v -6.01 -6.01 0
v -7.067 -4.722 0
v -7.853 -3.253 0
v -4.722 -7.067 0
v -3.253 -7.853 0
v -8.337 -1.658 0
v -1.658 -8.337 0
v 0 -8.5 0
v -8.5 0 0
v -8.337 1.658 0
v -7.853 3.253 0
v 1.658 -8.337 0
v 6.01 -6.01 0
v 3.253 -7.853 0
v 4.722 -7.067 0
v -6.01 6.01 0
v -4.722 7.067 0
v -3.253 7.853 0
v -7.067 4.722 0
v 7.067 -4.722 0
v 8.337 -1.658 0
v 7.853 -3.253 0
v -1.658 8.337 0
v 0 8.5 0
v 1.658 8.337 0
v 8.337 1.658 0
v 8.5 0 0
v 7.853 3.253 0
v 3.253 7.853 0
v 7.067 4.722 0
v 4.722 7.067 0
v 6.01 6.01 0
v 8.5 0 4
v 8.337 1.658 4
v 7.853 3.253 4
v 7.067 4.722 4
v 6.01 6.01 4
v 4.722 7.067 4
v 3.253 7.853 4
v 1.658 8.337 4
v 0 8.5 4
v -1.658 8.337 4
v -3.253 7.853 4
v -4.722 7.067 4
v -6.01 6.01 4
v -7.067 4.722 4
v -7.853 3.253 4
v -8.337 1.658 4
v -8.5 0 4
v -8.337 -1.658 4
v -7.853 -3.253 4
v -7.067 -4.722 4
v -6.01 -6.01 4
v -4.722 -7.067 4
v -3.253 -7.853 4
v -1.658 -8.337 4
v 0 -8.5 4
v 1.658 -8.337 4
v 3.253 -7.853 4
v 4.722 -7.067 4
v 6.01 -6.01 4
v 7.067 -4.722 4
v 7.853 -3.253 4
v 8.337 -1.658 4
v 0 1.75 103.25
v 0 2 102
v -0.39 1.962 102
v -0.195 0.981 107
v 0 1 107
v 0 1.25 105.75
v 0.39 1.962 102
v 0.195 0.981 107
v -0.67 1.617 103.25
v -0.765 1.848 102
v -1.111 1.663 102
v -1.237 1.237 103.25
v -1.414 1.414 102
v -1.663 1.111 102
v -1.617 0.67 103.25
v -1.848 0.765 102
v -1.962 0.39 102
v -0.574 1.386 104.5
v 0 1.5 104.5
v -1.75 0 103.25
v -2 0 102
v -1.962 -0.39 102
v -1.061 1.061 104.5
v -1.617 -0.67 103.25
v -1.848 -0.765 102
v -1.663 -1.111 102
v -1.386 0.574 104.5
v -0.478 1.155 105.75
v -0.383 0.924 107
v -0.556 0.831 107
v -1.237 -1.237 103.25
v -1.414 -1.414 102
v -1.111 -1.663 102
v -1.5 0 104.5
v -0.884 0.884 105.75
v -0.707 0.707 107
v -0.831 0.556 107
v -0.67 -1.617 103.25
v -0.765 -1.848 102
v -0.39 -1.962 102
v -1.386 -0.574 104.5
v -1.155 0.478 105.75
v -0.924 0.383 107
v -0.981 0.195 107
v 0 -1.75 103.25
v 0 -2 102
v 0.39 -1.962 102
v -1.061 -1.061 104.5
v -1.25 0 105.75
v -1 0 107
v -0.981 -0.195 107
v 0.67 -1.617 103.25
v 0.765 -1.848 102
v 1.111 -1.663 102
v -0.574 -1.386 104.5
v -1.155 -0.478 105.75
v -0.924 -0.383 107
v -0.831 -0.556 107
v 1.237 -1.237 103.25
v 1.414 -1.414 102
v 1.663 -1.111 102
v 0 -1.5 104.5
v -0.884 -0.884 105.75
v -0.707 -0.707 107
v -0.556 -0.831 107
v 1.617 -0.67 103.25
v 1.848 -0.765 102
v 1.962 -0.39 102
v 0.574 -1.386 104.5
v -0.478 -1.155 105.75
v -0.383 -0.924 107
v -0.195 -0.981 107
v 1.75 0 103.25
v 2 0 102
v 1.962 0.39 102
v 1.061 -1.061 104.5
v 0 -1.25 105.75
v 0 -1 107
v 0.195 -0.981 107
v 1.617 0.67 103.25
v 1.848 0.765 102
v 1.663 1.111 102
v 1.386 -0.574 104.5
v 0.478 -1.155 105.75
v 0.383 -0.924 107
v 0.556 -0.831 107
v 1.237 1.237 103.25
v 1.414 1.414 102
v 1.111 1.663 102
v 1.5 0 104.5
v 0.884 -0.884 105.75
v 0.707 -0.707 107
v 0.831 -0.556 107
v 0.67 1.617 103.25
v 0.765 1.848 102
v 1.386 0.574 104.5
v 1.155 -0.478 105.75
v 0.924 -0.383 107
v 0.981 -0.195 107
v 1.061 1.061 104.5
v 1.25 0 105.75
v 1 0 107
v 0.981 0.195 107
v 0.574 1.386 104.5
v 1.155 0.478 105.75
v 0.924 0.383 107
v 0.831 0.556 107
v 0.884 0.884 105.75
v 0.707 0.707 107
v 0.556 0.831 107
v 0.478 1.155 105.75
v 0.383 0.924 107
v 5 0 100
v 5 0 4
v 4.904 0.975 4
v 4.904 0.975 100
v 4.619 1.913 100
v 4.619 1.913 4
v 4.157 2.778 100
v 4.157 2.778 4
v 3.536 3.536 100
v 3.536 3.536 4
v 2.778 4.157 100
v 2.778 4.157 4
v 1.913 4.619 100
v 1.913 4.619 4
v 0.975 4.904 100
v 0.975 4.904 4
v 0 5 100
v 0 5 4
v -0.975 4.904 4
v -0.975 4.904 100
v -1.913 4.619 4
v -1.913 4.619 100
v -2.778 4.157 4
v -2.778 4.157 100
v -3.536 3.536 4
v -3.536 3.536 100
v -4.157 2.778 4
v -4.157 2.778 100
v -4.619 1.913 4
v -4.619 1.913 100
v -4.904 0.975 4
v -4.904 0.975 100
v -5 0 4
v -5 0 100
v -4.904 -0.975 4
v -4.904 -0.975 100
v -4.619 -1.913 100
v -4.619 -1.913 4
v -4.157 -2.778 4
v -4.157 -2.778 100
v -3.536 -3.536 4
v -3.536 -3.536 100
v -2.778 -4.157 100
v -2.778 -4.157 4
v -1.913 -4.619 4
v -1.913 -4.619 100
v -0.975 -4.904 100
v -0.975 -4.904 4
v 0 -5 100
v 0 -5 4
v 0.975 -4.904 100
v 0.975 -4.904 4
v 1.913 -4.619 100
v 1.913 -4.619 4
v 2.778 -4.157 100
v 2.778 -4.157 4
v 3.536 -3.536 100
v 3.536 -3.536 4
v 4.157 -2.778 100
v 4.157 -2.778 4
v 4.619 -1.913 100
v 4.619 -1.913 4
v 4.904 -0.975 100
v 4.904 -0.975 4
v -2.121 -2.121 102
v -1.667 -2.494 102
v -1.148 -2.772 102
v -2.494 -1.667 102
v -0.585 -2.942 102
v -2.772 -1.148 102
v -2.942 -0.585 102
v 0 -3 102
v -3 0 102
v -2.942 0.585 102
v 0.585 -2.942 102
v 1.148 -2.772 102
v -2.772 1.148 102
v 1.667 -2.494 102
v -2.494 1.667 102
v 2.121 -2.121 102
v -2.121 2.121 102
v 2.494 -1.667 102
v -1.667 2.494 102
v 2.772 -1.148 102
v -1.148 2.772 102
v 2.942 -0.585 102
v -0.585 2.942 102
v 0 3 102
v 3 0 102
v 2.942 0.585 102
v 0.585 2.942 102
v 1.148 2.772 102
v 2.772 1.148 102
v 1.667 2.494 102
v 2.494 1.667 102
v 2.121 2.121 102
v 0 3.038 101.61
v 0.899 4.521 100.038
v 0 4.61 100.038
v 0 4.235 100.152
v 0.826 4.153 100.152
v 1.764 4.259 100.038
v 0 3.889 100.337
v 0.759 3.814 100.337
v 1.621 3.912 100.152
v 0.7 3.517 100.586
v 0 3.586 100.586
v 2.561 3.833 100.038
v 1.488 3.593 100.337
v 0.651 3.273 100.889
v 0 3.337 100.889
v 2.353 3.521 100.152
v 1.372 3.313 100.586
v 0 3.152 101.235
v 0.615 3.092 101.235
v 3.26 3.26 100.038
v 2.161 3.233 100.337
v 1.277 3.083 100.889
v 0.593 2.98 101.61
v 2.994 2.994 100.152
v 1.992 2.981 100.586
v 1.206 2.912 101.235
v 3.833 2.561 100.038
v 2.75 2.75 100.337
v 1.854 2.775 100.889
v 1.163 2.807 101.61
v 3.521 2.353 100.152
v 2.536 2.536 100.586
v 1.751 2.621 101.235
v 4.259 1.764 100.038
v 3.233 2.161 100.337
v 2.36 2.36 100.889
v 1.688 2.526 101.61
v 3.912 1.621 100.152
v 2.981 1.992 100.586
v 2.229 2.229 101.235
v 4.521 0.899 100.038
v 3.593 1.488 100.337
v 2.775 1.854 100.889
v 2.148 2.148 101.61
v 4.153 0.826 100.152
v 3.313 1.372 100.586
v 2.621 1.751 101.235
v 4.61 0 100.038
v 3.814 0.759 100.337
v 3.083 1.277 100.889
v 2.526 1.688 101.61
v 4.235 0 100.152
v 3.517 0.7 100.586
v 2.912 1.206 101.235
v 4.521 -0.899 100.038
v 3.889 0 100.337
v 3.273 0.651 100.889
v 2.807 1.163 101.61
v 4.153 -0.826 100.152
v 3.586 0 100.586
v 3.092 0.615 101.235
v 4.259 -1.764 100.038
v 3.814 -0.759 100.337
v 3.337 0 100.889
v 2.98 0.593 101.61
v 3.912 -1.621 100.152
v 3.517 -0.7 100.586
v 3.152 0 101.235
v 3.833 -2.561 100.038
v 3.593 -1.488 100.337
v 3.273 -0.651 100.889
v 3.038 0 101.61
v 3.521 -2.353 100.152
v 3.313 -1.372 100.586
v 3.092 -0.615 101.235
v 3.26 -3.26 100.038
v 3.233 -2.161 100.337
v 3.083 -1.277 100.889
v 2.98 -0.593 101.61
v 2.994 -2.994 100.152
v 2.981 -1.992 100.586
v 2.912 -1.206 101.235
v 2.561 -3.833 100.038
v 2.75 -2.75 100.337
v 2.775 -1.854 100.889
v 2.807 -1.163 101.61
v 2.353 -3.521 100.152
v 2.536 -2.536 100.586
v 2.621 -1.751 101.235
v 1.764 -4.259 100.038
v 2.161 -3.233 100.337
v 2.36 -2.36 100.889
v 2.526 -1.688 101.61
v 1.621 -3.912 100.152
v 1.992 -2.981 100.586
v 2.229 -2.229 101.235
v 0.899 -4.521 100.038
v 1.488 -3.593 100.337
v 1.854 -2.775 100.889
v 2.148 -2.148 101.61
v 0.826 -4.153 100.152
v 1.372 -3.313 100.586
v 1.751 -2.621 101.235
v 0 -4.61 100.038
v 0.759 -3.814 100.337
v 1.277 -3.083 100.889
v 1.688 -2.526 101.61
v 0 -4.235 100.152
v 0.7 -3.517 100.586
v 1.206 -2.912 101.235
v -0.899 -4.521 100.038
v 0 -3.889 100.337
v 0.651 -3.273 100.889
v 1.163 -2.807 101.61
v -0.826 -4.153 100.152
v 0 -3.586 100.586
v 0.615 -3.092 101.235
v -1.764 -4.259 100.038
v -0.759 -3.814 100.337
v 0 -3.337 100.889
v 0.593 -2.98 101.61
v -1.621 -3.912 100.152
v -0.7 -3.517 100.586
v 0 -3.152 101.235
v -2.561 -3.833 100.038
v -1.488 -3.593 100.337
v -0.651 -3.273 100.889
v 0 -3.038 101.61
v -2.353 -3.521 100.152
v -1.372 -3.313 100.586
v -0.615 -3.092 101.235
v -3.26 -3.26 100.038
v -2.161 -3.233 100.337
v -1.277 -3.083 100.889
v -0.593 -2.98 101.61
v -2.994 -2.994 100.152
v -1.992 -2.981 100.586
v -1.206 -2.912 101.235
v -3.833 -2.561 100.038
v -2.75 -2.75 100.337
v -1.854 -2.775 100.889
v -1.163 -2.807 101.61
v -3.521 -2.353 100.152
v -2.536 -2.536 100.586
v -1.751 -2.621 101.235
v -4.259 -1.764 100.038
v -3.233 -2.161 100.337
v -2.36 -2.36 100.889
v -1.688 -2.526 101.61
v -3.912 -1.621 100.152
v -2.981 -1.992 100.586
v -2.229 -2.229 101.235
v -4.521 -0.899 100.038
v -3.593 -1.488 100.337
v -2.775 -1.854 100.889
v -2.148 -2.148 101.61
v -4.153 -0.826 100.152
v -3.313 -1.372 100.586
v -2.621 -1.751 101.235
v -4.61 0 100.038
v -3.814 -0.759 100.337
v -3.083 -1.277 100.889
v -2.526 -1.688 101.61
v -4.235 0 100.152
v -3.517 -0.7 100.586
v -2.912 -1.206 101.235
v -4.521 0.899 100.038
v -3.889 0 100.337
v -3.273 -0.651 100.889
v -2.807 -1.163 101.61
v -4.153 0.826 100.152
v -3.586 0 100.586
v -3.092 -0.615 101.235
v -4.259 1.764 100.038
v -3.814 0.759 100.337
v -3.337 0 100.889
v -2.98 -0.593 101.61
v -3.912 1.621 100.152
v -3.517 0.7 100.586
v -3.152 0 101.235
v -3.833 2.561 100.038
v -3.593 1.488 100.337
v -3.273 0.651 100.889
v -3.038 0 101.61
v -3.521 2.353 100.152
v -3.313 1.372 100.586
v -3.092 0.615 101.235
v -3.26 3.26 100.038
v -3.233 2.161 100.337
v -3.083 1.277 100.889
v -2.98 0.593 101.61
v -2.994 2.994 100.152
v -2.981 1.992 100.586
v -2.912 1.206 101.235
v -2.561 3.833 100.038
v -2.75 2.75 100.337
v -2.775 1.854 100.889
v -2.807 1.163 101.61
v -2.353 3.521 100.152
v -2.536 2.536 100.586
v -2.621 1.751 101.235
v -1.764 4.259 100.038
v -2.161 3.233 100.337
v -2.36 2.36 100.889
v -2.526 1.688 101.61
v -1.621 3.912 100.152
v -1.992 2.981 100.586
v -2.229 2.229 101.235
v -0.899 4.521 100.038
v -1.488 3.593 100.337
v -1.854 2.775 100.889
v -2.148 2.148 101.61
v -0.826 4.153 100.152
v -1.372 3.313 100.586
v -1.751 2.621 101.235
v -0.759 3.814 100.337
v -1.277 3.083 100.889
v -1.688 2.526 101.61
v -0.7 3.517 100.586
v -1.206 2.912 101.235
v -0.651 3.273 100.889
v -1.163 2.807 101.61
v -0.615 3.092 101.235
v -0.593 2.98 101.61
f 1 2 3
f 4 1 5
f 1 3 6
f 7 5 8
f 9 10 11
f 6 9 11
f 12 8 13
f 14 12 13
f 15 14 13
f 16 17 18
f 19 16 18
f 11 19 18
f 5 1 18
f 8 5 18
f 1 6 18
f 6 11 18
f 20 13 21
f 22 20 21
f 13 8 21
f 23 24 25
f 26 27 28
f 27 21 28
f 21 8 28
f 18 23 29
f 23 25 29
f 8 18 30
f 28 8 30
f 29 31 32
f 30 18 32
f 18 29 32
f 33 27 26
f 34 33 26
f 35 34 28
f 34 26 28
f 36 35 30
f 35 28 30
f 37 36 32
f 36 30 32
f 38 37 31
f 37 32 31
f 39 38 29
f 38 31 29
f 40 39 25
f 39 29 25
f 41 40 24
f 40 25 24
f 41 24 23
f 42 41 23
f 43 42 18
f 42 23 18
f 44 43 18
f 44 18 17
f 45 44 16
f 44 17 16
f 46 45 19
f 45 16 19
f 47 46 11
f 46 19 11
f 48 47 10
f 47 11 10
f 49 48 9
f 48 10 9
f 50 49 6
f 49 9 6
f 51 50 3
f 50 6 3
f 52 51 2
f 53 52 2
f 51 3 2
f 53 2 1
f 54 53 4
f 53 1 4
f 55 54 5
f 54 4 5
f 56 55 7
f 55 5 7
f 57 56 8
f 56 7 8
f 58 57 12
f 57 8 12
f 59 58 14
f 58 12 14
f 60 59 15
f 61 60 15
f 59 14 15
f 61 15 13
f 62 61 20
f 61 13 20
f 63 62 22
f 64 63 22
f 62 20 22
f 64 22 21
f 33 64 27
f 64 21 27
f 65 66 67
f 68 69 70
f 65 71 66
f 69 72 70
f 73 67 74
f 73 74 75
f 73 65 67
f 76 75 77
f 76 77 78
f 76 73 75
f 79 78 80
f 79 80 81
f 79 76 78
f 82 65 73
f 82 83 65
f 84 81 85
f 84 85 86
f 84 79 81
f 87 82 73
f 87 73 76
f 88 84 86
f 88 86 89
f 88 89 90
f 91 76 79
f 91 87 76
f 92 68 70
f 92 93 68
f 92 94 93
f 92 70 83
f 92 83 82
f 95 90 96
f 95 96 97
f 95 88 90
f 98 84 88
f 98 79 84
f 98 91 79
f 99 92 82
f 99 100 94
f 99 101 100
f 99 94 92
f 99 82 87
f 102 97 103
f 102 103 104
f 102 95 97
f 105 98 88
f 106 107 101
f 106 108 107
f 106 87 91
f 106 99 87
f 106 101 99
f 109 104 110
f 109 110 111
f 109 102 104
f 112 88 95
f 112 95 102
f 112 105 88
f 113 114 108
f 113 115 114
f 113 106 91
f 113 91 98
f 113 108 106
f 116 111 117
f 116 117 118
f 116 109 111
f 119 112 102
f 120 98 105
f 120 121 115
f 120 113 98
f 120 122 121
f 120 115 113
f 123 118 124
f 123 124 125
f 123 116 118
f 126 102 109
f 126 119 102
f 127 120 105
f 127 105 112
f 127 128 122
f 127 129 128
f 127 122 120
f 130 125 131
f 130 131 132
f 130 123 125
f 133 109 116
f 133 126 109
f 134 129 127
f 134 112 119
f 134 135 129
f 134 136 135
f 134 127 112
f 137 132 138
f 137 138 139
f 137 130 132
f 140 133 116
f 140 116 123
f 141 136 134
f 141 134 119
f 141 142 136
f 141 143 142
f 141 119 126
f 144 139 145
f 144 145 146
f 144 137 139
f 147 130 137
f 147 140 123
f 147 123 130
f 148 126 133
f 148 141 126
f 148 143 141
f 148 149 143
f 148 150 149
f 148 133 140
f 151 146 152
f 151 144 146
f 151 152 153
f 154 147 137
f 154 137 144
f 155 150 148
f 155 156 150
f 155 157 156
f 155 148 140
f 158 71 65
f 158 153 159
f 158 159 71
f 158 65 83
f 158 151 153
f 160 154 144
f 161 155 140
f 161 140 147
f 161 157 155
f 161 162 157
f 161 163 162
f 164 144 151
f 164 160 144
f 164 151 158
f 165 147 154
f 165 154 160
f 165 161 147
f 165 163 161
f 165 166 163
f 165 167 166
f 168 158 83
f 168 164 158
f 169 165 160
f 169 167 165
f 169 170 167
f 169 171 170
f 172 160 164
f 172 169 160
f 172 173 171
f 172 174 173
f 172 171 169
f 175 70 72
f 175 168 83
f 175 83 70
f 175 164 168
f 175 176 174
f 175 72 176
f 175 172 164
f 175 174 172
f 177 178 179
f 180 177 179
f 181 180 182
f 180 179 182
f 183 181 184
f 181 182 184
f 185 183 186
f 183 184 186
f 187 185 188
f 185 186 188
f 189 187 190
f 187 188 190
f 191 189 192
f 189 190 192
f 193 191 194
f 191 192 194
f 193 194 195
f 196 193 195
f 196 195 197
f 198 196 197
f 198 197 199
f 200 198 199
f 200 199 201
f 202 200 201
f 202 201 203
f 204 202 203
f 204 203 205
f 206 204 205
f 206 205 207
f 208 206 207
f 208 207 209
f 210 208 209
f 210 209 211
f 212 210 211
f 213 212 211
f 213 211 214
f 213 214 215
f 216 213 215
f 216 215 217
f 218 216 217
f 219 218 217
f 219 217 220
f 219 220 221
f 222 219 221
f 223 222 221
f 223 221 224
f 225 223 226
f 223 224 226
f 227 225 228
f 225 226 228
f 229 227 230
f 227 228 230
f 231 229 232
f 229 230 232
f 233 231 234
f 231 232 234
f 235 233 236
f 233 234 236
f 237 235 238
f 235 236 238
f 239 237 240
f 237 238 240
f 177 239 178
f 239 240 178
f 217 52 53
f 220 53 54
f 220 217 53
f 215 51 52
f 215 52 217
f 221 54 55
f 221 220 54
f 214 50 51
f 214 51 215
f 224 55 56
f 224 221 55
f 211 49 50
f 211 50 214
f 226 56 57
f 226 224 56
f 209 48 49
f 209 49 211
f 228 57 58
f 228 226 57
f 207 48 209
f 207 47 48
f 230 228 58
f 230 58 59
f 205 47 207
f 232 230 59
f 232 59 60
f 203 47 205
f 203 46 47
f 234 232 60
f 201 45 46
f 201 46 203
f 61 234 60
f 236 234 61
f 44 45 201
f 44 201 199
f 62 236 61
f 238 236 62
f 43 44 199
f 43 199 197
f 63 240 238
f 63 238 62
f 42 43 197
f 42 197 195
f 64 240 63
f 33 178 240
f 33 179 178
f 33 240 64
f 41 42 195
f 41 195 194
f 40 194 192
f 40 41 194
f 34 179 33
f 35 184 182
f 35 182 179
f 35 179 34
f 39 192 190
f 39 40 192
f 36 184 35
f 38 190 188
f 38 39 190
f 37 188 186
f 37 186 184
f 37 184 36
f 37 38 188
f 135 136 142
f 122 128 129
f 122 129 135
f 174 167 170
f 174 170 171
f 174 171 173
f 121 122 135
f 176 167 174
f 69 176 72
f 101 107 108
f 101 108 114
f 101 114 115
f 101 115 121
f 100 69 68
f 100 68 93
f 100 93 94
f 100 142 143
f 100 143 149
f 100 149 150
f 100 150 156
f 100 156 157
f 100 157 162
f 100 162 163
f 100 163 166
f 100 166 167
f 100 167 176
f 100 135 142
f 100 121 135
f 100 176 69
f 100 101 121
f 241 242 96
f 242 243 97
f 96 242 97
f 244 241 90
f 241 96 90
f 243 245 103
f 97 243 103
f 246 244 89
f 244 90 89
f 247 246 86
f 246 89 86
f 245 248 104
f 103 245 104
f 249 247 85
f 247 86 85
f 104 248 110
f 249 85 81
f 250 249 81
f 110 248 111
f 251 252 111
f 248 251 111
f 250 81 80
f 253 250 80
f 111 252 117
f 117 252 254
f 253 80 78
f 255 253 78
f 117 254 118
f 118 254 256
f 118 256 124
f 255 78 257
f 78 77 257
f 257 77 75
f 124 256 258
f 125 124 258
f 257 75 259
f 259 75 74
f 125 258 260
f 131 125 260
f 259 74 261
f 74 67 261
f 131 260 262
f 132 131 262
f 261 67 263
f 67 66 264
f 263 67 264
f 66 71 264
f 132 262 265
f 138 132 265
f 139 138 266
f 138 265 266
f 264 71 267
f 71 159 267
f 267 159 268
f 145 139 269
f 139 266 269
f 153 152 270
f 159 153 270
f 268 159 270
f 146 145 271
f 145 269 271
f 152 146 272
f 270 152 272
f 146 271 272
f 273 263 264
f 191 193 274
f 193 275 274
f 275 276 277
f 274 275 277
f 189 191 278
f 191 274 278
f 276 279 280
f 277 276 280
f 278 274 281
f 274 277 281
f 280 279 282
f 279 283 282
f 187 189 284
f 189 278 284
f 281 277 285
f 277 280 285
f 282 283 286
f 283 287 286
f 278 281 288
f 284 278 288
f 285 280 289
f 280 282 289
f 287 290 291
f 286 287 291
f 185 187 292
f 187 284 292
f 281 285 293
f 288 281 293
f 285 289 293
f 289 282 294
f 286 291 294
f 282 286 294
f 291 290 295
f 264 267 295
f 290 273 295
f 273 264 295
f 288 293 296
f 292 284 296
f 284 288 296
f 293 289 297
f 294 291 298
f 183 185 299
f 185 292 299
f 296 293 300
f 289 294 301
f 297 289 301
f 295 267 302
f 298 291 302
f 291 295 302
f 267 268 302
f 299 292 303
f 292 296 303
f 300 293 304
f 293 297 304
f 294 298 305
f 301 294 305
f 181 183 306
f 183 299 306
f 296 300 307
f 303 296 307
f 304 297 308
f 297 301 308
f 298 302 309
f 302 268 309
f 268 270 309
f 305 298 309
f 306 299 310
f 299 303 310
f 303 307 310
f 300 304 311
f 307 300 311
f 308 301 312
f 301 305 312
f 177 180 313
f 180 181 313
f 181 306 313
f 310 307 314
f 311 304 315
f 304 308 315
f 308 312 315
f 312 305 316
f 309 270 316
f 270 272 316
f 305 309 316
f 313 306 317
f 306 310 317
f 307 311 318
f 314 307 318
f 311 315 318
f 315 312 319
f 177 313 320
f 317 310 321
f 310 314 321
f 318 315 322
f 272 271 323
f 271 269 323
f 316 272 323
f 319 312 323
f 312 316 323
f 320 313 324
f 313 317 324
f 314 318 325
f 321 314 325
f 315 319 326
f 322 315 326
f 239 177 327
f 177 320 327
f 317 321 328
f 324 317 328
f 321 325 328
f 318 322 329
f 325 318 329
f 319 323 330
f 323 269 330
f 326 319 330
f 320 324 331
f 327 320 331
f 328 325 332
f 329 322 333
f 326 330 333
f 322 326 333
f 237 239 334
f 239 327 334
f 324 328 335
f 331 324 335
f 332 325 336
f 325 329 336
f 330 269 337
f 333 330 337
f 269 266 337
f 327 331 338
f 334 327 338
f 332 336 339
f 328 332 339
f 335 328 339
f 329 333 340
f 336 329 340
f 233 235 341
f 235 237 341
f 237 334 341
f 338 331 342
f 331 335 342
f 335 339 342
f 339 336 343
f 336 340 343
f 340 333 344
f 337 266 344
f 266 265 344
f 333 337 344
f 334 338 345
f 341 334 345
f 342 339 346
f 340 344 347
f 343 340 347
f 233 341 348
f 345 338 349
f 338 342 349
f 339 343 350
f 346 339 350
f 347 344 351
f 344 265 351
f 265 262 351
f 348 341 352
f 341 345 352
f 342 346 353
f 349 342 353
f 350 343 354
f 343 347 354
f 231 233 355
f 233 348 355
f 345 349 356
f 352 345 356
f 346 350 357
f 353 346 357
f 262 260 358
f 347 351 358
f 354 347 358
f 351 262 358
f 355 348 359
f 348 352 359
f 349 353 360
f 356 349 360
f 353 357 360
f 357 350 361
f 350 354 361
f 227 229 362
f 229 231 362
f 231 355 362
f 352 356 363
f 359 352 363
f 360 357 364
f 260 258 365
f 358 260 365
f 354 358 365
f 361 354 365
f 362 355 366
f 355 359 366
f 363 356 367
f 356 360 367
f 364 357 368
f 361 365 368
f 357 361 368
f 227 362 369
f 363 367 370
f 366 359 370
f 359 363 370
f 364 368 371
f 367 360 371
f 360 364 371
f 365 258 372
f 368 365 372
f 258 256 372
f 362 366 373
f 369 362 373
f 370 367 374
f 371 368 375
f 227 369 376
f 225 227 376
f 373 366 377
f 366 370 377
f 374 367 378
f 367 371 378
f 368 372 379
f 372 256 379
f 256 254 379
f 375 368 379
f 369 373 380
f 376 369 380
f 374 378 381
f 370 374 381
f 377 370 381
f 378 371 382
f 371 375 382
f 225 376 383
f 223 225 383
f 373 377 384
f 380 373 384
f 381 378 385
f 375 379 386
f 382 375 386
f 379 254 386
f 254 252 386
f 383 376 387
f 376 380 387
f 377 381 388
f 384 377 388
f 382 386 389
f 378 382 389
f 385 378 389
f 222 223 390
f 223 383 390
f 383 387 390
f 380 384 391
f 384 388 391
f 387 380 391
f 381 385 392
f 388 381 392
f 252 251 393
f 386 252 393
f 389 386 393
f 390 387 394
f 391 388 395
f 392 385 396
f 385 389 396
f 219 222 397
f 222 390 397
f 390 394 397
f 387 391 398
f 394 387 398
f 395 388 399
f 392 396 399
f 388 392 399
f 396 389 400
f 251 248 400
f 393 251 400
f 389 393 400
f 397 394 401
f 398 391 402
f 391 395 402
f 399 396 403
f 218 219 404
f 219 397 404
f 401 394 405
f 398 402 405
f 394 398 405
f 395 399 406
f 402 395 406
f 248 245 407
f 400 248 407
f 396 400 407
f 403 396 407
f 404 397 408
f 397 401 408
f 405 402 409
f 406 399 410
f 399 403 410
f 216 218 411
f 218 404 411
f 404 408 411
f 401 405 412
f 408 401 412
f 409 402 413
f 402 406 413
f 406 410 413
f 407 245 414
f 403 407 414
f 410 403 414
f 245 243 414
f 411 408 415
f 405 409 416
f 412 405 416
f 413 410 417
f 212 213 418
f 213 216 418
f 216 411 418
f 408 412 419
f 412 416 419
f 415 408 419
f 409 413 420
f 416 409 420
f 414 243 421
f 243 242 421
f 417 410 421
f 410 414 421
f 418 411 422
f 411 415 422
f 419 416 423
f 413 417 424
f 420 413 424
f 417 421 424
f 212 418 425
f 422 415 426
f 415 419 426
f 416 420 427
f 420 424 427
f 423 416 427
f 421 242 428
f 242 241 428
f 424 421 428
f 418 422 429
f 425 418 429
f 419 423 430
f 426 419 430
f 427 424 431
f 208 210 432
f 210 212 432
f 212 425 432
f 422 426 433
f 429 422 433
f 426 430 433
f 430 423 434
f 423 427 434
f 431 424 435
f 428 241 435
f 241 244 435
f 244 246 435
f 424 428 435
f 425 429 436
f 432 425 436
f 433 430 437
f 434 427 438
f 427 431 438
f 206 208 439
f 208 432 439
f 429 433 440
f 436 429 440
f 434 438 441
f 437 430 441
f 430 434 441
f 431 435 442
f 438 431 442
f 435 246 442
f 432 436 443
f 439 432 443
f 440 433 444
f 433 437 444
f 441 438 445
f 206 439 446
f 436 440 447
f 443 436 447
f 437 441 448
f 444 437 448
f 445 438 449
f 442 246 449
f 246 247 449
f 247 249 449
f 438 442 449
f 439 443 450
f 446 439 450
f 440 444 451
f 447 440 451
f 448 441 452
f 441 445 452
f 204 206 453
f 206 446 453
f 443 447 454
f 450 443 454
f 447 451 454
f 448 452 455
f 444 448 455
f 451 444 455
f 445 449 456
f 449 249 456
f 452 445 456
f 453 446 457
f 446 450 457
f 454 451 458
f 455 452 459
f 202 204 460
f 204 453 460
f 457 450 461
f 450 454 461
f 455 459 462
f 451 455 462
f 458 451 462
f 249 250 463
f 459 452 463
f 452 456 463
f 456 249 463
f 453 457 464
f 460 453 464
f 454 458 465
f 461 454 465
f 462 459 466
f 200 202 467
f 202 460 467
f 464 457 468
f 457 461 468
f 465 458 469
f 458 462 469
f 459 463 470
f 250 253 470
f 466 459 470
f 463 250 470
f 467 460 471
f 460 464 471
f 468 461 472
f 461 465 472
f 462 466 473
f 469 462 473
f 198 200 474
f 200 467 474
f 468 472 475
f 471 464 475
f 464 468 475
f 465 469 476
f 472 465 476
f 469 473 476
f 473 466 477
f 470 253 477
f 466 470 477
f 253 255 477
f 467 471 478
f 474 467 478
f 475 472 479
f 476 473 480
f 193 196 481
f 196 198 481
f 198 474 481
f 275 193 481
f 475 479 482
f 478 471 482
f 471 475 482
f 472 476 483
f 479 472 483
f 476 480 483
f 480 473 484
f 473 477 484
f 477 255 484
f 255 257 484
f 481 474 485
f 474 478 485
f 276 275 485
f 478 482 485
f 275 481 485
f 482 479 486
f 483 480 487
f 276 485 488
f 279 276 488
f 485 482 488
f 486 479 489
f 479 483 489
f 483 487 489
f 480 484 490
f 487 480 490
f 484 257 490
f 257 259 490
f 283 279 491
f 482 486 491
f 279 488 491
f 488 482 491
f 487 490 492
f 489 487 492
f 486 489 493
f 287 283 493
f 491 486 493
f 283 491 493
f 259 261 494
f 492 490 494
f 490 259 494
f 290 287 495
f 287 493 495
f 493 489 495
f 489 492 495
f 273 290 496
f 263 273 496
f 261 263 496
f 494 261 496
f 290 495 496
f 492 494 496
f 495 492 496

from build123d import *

# Parameters (mm, degrees)
F0_R     = 8.5
F1_DEPTH = 4
F2_R     = 5
F3_DEPTH = 100


with BuildPart() as f1:
    # F0 (on Top) → F1 (new body)
    with BuildSketch(Plane.XY):
        Circle(F0_R)
    extrude(amount=F1_DEPTH)

    # F2 (on Top) → F3 (join)
    with BuildSketch(Plane.XY):
        Circle(F2_R)
    extrude(amount=F3_DEPTH)

    # F4 (on Right) → F5 (revolve)
    with BuildSketch(Plane.YZ):
        with BuildLine():
            Line((3, 102), (0, 102))
            Line((0, 102), (0, 100))
            Line((0, 100), (5, 100))
            ThreePointArc((5, 100), (3.585786, 100.585786), (3, 102))
        make_face()
    revolve(axis=Axis((0, 0, 101), (0, 0, -1)))

    # F6 (on Right) → F7 (revolve)
    with BuildSketch(Plane.YZ):
        Polygon((0, 107), (0, 102), (2, 102), (1, 107), align=None)
    revolve(axis=Axis((0, 0, 104.5), (0, 0, 1)))


solid = f1.part
